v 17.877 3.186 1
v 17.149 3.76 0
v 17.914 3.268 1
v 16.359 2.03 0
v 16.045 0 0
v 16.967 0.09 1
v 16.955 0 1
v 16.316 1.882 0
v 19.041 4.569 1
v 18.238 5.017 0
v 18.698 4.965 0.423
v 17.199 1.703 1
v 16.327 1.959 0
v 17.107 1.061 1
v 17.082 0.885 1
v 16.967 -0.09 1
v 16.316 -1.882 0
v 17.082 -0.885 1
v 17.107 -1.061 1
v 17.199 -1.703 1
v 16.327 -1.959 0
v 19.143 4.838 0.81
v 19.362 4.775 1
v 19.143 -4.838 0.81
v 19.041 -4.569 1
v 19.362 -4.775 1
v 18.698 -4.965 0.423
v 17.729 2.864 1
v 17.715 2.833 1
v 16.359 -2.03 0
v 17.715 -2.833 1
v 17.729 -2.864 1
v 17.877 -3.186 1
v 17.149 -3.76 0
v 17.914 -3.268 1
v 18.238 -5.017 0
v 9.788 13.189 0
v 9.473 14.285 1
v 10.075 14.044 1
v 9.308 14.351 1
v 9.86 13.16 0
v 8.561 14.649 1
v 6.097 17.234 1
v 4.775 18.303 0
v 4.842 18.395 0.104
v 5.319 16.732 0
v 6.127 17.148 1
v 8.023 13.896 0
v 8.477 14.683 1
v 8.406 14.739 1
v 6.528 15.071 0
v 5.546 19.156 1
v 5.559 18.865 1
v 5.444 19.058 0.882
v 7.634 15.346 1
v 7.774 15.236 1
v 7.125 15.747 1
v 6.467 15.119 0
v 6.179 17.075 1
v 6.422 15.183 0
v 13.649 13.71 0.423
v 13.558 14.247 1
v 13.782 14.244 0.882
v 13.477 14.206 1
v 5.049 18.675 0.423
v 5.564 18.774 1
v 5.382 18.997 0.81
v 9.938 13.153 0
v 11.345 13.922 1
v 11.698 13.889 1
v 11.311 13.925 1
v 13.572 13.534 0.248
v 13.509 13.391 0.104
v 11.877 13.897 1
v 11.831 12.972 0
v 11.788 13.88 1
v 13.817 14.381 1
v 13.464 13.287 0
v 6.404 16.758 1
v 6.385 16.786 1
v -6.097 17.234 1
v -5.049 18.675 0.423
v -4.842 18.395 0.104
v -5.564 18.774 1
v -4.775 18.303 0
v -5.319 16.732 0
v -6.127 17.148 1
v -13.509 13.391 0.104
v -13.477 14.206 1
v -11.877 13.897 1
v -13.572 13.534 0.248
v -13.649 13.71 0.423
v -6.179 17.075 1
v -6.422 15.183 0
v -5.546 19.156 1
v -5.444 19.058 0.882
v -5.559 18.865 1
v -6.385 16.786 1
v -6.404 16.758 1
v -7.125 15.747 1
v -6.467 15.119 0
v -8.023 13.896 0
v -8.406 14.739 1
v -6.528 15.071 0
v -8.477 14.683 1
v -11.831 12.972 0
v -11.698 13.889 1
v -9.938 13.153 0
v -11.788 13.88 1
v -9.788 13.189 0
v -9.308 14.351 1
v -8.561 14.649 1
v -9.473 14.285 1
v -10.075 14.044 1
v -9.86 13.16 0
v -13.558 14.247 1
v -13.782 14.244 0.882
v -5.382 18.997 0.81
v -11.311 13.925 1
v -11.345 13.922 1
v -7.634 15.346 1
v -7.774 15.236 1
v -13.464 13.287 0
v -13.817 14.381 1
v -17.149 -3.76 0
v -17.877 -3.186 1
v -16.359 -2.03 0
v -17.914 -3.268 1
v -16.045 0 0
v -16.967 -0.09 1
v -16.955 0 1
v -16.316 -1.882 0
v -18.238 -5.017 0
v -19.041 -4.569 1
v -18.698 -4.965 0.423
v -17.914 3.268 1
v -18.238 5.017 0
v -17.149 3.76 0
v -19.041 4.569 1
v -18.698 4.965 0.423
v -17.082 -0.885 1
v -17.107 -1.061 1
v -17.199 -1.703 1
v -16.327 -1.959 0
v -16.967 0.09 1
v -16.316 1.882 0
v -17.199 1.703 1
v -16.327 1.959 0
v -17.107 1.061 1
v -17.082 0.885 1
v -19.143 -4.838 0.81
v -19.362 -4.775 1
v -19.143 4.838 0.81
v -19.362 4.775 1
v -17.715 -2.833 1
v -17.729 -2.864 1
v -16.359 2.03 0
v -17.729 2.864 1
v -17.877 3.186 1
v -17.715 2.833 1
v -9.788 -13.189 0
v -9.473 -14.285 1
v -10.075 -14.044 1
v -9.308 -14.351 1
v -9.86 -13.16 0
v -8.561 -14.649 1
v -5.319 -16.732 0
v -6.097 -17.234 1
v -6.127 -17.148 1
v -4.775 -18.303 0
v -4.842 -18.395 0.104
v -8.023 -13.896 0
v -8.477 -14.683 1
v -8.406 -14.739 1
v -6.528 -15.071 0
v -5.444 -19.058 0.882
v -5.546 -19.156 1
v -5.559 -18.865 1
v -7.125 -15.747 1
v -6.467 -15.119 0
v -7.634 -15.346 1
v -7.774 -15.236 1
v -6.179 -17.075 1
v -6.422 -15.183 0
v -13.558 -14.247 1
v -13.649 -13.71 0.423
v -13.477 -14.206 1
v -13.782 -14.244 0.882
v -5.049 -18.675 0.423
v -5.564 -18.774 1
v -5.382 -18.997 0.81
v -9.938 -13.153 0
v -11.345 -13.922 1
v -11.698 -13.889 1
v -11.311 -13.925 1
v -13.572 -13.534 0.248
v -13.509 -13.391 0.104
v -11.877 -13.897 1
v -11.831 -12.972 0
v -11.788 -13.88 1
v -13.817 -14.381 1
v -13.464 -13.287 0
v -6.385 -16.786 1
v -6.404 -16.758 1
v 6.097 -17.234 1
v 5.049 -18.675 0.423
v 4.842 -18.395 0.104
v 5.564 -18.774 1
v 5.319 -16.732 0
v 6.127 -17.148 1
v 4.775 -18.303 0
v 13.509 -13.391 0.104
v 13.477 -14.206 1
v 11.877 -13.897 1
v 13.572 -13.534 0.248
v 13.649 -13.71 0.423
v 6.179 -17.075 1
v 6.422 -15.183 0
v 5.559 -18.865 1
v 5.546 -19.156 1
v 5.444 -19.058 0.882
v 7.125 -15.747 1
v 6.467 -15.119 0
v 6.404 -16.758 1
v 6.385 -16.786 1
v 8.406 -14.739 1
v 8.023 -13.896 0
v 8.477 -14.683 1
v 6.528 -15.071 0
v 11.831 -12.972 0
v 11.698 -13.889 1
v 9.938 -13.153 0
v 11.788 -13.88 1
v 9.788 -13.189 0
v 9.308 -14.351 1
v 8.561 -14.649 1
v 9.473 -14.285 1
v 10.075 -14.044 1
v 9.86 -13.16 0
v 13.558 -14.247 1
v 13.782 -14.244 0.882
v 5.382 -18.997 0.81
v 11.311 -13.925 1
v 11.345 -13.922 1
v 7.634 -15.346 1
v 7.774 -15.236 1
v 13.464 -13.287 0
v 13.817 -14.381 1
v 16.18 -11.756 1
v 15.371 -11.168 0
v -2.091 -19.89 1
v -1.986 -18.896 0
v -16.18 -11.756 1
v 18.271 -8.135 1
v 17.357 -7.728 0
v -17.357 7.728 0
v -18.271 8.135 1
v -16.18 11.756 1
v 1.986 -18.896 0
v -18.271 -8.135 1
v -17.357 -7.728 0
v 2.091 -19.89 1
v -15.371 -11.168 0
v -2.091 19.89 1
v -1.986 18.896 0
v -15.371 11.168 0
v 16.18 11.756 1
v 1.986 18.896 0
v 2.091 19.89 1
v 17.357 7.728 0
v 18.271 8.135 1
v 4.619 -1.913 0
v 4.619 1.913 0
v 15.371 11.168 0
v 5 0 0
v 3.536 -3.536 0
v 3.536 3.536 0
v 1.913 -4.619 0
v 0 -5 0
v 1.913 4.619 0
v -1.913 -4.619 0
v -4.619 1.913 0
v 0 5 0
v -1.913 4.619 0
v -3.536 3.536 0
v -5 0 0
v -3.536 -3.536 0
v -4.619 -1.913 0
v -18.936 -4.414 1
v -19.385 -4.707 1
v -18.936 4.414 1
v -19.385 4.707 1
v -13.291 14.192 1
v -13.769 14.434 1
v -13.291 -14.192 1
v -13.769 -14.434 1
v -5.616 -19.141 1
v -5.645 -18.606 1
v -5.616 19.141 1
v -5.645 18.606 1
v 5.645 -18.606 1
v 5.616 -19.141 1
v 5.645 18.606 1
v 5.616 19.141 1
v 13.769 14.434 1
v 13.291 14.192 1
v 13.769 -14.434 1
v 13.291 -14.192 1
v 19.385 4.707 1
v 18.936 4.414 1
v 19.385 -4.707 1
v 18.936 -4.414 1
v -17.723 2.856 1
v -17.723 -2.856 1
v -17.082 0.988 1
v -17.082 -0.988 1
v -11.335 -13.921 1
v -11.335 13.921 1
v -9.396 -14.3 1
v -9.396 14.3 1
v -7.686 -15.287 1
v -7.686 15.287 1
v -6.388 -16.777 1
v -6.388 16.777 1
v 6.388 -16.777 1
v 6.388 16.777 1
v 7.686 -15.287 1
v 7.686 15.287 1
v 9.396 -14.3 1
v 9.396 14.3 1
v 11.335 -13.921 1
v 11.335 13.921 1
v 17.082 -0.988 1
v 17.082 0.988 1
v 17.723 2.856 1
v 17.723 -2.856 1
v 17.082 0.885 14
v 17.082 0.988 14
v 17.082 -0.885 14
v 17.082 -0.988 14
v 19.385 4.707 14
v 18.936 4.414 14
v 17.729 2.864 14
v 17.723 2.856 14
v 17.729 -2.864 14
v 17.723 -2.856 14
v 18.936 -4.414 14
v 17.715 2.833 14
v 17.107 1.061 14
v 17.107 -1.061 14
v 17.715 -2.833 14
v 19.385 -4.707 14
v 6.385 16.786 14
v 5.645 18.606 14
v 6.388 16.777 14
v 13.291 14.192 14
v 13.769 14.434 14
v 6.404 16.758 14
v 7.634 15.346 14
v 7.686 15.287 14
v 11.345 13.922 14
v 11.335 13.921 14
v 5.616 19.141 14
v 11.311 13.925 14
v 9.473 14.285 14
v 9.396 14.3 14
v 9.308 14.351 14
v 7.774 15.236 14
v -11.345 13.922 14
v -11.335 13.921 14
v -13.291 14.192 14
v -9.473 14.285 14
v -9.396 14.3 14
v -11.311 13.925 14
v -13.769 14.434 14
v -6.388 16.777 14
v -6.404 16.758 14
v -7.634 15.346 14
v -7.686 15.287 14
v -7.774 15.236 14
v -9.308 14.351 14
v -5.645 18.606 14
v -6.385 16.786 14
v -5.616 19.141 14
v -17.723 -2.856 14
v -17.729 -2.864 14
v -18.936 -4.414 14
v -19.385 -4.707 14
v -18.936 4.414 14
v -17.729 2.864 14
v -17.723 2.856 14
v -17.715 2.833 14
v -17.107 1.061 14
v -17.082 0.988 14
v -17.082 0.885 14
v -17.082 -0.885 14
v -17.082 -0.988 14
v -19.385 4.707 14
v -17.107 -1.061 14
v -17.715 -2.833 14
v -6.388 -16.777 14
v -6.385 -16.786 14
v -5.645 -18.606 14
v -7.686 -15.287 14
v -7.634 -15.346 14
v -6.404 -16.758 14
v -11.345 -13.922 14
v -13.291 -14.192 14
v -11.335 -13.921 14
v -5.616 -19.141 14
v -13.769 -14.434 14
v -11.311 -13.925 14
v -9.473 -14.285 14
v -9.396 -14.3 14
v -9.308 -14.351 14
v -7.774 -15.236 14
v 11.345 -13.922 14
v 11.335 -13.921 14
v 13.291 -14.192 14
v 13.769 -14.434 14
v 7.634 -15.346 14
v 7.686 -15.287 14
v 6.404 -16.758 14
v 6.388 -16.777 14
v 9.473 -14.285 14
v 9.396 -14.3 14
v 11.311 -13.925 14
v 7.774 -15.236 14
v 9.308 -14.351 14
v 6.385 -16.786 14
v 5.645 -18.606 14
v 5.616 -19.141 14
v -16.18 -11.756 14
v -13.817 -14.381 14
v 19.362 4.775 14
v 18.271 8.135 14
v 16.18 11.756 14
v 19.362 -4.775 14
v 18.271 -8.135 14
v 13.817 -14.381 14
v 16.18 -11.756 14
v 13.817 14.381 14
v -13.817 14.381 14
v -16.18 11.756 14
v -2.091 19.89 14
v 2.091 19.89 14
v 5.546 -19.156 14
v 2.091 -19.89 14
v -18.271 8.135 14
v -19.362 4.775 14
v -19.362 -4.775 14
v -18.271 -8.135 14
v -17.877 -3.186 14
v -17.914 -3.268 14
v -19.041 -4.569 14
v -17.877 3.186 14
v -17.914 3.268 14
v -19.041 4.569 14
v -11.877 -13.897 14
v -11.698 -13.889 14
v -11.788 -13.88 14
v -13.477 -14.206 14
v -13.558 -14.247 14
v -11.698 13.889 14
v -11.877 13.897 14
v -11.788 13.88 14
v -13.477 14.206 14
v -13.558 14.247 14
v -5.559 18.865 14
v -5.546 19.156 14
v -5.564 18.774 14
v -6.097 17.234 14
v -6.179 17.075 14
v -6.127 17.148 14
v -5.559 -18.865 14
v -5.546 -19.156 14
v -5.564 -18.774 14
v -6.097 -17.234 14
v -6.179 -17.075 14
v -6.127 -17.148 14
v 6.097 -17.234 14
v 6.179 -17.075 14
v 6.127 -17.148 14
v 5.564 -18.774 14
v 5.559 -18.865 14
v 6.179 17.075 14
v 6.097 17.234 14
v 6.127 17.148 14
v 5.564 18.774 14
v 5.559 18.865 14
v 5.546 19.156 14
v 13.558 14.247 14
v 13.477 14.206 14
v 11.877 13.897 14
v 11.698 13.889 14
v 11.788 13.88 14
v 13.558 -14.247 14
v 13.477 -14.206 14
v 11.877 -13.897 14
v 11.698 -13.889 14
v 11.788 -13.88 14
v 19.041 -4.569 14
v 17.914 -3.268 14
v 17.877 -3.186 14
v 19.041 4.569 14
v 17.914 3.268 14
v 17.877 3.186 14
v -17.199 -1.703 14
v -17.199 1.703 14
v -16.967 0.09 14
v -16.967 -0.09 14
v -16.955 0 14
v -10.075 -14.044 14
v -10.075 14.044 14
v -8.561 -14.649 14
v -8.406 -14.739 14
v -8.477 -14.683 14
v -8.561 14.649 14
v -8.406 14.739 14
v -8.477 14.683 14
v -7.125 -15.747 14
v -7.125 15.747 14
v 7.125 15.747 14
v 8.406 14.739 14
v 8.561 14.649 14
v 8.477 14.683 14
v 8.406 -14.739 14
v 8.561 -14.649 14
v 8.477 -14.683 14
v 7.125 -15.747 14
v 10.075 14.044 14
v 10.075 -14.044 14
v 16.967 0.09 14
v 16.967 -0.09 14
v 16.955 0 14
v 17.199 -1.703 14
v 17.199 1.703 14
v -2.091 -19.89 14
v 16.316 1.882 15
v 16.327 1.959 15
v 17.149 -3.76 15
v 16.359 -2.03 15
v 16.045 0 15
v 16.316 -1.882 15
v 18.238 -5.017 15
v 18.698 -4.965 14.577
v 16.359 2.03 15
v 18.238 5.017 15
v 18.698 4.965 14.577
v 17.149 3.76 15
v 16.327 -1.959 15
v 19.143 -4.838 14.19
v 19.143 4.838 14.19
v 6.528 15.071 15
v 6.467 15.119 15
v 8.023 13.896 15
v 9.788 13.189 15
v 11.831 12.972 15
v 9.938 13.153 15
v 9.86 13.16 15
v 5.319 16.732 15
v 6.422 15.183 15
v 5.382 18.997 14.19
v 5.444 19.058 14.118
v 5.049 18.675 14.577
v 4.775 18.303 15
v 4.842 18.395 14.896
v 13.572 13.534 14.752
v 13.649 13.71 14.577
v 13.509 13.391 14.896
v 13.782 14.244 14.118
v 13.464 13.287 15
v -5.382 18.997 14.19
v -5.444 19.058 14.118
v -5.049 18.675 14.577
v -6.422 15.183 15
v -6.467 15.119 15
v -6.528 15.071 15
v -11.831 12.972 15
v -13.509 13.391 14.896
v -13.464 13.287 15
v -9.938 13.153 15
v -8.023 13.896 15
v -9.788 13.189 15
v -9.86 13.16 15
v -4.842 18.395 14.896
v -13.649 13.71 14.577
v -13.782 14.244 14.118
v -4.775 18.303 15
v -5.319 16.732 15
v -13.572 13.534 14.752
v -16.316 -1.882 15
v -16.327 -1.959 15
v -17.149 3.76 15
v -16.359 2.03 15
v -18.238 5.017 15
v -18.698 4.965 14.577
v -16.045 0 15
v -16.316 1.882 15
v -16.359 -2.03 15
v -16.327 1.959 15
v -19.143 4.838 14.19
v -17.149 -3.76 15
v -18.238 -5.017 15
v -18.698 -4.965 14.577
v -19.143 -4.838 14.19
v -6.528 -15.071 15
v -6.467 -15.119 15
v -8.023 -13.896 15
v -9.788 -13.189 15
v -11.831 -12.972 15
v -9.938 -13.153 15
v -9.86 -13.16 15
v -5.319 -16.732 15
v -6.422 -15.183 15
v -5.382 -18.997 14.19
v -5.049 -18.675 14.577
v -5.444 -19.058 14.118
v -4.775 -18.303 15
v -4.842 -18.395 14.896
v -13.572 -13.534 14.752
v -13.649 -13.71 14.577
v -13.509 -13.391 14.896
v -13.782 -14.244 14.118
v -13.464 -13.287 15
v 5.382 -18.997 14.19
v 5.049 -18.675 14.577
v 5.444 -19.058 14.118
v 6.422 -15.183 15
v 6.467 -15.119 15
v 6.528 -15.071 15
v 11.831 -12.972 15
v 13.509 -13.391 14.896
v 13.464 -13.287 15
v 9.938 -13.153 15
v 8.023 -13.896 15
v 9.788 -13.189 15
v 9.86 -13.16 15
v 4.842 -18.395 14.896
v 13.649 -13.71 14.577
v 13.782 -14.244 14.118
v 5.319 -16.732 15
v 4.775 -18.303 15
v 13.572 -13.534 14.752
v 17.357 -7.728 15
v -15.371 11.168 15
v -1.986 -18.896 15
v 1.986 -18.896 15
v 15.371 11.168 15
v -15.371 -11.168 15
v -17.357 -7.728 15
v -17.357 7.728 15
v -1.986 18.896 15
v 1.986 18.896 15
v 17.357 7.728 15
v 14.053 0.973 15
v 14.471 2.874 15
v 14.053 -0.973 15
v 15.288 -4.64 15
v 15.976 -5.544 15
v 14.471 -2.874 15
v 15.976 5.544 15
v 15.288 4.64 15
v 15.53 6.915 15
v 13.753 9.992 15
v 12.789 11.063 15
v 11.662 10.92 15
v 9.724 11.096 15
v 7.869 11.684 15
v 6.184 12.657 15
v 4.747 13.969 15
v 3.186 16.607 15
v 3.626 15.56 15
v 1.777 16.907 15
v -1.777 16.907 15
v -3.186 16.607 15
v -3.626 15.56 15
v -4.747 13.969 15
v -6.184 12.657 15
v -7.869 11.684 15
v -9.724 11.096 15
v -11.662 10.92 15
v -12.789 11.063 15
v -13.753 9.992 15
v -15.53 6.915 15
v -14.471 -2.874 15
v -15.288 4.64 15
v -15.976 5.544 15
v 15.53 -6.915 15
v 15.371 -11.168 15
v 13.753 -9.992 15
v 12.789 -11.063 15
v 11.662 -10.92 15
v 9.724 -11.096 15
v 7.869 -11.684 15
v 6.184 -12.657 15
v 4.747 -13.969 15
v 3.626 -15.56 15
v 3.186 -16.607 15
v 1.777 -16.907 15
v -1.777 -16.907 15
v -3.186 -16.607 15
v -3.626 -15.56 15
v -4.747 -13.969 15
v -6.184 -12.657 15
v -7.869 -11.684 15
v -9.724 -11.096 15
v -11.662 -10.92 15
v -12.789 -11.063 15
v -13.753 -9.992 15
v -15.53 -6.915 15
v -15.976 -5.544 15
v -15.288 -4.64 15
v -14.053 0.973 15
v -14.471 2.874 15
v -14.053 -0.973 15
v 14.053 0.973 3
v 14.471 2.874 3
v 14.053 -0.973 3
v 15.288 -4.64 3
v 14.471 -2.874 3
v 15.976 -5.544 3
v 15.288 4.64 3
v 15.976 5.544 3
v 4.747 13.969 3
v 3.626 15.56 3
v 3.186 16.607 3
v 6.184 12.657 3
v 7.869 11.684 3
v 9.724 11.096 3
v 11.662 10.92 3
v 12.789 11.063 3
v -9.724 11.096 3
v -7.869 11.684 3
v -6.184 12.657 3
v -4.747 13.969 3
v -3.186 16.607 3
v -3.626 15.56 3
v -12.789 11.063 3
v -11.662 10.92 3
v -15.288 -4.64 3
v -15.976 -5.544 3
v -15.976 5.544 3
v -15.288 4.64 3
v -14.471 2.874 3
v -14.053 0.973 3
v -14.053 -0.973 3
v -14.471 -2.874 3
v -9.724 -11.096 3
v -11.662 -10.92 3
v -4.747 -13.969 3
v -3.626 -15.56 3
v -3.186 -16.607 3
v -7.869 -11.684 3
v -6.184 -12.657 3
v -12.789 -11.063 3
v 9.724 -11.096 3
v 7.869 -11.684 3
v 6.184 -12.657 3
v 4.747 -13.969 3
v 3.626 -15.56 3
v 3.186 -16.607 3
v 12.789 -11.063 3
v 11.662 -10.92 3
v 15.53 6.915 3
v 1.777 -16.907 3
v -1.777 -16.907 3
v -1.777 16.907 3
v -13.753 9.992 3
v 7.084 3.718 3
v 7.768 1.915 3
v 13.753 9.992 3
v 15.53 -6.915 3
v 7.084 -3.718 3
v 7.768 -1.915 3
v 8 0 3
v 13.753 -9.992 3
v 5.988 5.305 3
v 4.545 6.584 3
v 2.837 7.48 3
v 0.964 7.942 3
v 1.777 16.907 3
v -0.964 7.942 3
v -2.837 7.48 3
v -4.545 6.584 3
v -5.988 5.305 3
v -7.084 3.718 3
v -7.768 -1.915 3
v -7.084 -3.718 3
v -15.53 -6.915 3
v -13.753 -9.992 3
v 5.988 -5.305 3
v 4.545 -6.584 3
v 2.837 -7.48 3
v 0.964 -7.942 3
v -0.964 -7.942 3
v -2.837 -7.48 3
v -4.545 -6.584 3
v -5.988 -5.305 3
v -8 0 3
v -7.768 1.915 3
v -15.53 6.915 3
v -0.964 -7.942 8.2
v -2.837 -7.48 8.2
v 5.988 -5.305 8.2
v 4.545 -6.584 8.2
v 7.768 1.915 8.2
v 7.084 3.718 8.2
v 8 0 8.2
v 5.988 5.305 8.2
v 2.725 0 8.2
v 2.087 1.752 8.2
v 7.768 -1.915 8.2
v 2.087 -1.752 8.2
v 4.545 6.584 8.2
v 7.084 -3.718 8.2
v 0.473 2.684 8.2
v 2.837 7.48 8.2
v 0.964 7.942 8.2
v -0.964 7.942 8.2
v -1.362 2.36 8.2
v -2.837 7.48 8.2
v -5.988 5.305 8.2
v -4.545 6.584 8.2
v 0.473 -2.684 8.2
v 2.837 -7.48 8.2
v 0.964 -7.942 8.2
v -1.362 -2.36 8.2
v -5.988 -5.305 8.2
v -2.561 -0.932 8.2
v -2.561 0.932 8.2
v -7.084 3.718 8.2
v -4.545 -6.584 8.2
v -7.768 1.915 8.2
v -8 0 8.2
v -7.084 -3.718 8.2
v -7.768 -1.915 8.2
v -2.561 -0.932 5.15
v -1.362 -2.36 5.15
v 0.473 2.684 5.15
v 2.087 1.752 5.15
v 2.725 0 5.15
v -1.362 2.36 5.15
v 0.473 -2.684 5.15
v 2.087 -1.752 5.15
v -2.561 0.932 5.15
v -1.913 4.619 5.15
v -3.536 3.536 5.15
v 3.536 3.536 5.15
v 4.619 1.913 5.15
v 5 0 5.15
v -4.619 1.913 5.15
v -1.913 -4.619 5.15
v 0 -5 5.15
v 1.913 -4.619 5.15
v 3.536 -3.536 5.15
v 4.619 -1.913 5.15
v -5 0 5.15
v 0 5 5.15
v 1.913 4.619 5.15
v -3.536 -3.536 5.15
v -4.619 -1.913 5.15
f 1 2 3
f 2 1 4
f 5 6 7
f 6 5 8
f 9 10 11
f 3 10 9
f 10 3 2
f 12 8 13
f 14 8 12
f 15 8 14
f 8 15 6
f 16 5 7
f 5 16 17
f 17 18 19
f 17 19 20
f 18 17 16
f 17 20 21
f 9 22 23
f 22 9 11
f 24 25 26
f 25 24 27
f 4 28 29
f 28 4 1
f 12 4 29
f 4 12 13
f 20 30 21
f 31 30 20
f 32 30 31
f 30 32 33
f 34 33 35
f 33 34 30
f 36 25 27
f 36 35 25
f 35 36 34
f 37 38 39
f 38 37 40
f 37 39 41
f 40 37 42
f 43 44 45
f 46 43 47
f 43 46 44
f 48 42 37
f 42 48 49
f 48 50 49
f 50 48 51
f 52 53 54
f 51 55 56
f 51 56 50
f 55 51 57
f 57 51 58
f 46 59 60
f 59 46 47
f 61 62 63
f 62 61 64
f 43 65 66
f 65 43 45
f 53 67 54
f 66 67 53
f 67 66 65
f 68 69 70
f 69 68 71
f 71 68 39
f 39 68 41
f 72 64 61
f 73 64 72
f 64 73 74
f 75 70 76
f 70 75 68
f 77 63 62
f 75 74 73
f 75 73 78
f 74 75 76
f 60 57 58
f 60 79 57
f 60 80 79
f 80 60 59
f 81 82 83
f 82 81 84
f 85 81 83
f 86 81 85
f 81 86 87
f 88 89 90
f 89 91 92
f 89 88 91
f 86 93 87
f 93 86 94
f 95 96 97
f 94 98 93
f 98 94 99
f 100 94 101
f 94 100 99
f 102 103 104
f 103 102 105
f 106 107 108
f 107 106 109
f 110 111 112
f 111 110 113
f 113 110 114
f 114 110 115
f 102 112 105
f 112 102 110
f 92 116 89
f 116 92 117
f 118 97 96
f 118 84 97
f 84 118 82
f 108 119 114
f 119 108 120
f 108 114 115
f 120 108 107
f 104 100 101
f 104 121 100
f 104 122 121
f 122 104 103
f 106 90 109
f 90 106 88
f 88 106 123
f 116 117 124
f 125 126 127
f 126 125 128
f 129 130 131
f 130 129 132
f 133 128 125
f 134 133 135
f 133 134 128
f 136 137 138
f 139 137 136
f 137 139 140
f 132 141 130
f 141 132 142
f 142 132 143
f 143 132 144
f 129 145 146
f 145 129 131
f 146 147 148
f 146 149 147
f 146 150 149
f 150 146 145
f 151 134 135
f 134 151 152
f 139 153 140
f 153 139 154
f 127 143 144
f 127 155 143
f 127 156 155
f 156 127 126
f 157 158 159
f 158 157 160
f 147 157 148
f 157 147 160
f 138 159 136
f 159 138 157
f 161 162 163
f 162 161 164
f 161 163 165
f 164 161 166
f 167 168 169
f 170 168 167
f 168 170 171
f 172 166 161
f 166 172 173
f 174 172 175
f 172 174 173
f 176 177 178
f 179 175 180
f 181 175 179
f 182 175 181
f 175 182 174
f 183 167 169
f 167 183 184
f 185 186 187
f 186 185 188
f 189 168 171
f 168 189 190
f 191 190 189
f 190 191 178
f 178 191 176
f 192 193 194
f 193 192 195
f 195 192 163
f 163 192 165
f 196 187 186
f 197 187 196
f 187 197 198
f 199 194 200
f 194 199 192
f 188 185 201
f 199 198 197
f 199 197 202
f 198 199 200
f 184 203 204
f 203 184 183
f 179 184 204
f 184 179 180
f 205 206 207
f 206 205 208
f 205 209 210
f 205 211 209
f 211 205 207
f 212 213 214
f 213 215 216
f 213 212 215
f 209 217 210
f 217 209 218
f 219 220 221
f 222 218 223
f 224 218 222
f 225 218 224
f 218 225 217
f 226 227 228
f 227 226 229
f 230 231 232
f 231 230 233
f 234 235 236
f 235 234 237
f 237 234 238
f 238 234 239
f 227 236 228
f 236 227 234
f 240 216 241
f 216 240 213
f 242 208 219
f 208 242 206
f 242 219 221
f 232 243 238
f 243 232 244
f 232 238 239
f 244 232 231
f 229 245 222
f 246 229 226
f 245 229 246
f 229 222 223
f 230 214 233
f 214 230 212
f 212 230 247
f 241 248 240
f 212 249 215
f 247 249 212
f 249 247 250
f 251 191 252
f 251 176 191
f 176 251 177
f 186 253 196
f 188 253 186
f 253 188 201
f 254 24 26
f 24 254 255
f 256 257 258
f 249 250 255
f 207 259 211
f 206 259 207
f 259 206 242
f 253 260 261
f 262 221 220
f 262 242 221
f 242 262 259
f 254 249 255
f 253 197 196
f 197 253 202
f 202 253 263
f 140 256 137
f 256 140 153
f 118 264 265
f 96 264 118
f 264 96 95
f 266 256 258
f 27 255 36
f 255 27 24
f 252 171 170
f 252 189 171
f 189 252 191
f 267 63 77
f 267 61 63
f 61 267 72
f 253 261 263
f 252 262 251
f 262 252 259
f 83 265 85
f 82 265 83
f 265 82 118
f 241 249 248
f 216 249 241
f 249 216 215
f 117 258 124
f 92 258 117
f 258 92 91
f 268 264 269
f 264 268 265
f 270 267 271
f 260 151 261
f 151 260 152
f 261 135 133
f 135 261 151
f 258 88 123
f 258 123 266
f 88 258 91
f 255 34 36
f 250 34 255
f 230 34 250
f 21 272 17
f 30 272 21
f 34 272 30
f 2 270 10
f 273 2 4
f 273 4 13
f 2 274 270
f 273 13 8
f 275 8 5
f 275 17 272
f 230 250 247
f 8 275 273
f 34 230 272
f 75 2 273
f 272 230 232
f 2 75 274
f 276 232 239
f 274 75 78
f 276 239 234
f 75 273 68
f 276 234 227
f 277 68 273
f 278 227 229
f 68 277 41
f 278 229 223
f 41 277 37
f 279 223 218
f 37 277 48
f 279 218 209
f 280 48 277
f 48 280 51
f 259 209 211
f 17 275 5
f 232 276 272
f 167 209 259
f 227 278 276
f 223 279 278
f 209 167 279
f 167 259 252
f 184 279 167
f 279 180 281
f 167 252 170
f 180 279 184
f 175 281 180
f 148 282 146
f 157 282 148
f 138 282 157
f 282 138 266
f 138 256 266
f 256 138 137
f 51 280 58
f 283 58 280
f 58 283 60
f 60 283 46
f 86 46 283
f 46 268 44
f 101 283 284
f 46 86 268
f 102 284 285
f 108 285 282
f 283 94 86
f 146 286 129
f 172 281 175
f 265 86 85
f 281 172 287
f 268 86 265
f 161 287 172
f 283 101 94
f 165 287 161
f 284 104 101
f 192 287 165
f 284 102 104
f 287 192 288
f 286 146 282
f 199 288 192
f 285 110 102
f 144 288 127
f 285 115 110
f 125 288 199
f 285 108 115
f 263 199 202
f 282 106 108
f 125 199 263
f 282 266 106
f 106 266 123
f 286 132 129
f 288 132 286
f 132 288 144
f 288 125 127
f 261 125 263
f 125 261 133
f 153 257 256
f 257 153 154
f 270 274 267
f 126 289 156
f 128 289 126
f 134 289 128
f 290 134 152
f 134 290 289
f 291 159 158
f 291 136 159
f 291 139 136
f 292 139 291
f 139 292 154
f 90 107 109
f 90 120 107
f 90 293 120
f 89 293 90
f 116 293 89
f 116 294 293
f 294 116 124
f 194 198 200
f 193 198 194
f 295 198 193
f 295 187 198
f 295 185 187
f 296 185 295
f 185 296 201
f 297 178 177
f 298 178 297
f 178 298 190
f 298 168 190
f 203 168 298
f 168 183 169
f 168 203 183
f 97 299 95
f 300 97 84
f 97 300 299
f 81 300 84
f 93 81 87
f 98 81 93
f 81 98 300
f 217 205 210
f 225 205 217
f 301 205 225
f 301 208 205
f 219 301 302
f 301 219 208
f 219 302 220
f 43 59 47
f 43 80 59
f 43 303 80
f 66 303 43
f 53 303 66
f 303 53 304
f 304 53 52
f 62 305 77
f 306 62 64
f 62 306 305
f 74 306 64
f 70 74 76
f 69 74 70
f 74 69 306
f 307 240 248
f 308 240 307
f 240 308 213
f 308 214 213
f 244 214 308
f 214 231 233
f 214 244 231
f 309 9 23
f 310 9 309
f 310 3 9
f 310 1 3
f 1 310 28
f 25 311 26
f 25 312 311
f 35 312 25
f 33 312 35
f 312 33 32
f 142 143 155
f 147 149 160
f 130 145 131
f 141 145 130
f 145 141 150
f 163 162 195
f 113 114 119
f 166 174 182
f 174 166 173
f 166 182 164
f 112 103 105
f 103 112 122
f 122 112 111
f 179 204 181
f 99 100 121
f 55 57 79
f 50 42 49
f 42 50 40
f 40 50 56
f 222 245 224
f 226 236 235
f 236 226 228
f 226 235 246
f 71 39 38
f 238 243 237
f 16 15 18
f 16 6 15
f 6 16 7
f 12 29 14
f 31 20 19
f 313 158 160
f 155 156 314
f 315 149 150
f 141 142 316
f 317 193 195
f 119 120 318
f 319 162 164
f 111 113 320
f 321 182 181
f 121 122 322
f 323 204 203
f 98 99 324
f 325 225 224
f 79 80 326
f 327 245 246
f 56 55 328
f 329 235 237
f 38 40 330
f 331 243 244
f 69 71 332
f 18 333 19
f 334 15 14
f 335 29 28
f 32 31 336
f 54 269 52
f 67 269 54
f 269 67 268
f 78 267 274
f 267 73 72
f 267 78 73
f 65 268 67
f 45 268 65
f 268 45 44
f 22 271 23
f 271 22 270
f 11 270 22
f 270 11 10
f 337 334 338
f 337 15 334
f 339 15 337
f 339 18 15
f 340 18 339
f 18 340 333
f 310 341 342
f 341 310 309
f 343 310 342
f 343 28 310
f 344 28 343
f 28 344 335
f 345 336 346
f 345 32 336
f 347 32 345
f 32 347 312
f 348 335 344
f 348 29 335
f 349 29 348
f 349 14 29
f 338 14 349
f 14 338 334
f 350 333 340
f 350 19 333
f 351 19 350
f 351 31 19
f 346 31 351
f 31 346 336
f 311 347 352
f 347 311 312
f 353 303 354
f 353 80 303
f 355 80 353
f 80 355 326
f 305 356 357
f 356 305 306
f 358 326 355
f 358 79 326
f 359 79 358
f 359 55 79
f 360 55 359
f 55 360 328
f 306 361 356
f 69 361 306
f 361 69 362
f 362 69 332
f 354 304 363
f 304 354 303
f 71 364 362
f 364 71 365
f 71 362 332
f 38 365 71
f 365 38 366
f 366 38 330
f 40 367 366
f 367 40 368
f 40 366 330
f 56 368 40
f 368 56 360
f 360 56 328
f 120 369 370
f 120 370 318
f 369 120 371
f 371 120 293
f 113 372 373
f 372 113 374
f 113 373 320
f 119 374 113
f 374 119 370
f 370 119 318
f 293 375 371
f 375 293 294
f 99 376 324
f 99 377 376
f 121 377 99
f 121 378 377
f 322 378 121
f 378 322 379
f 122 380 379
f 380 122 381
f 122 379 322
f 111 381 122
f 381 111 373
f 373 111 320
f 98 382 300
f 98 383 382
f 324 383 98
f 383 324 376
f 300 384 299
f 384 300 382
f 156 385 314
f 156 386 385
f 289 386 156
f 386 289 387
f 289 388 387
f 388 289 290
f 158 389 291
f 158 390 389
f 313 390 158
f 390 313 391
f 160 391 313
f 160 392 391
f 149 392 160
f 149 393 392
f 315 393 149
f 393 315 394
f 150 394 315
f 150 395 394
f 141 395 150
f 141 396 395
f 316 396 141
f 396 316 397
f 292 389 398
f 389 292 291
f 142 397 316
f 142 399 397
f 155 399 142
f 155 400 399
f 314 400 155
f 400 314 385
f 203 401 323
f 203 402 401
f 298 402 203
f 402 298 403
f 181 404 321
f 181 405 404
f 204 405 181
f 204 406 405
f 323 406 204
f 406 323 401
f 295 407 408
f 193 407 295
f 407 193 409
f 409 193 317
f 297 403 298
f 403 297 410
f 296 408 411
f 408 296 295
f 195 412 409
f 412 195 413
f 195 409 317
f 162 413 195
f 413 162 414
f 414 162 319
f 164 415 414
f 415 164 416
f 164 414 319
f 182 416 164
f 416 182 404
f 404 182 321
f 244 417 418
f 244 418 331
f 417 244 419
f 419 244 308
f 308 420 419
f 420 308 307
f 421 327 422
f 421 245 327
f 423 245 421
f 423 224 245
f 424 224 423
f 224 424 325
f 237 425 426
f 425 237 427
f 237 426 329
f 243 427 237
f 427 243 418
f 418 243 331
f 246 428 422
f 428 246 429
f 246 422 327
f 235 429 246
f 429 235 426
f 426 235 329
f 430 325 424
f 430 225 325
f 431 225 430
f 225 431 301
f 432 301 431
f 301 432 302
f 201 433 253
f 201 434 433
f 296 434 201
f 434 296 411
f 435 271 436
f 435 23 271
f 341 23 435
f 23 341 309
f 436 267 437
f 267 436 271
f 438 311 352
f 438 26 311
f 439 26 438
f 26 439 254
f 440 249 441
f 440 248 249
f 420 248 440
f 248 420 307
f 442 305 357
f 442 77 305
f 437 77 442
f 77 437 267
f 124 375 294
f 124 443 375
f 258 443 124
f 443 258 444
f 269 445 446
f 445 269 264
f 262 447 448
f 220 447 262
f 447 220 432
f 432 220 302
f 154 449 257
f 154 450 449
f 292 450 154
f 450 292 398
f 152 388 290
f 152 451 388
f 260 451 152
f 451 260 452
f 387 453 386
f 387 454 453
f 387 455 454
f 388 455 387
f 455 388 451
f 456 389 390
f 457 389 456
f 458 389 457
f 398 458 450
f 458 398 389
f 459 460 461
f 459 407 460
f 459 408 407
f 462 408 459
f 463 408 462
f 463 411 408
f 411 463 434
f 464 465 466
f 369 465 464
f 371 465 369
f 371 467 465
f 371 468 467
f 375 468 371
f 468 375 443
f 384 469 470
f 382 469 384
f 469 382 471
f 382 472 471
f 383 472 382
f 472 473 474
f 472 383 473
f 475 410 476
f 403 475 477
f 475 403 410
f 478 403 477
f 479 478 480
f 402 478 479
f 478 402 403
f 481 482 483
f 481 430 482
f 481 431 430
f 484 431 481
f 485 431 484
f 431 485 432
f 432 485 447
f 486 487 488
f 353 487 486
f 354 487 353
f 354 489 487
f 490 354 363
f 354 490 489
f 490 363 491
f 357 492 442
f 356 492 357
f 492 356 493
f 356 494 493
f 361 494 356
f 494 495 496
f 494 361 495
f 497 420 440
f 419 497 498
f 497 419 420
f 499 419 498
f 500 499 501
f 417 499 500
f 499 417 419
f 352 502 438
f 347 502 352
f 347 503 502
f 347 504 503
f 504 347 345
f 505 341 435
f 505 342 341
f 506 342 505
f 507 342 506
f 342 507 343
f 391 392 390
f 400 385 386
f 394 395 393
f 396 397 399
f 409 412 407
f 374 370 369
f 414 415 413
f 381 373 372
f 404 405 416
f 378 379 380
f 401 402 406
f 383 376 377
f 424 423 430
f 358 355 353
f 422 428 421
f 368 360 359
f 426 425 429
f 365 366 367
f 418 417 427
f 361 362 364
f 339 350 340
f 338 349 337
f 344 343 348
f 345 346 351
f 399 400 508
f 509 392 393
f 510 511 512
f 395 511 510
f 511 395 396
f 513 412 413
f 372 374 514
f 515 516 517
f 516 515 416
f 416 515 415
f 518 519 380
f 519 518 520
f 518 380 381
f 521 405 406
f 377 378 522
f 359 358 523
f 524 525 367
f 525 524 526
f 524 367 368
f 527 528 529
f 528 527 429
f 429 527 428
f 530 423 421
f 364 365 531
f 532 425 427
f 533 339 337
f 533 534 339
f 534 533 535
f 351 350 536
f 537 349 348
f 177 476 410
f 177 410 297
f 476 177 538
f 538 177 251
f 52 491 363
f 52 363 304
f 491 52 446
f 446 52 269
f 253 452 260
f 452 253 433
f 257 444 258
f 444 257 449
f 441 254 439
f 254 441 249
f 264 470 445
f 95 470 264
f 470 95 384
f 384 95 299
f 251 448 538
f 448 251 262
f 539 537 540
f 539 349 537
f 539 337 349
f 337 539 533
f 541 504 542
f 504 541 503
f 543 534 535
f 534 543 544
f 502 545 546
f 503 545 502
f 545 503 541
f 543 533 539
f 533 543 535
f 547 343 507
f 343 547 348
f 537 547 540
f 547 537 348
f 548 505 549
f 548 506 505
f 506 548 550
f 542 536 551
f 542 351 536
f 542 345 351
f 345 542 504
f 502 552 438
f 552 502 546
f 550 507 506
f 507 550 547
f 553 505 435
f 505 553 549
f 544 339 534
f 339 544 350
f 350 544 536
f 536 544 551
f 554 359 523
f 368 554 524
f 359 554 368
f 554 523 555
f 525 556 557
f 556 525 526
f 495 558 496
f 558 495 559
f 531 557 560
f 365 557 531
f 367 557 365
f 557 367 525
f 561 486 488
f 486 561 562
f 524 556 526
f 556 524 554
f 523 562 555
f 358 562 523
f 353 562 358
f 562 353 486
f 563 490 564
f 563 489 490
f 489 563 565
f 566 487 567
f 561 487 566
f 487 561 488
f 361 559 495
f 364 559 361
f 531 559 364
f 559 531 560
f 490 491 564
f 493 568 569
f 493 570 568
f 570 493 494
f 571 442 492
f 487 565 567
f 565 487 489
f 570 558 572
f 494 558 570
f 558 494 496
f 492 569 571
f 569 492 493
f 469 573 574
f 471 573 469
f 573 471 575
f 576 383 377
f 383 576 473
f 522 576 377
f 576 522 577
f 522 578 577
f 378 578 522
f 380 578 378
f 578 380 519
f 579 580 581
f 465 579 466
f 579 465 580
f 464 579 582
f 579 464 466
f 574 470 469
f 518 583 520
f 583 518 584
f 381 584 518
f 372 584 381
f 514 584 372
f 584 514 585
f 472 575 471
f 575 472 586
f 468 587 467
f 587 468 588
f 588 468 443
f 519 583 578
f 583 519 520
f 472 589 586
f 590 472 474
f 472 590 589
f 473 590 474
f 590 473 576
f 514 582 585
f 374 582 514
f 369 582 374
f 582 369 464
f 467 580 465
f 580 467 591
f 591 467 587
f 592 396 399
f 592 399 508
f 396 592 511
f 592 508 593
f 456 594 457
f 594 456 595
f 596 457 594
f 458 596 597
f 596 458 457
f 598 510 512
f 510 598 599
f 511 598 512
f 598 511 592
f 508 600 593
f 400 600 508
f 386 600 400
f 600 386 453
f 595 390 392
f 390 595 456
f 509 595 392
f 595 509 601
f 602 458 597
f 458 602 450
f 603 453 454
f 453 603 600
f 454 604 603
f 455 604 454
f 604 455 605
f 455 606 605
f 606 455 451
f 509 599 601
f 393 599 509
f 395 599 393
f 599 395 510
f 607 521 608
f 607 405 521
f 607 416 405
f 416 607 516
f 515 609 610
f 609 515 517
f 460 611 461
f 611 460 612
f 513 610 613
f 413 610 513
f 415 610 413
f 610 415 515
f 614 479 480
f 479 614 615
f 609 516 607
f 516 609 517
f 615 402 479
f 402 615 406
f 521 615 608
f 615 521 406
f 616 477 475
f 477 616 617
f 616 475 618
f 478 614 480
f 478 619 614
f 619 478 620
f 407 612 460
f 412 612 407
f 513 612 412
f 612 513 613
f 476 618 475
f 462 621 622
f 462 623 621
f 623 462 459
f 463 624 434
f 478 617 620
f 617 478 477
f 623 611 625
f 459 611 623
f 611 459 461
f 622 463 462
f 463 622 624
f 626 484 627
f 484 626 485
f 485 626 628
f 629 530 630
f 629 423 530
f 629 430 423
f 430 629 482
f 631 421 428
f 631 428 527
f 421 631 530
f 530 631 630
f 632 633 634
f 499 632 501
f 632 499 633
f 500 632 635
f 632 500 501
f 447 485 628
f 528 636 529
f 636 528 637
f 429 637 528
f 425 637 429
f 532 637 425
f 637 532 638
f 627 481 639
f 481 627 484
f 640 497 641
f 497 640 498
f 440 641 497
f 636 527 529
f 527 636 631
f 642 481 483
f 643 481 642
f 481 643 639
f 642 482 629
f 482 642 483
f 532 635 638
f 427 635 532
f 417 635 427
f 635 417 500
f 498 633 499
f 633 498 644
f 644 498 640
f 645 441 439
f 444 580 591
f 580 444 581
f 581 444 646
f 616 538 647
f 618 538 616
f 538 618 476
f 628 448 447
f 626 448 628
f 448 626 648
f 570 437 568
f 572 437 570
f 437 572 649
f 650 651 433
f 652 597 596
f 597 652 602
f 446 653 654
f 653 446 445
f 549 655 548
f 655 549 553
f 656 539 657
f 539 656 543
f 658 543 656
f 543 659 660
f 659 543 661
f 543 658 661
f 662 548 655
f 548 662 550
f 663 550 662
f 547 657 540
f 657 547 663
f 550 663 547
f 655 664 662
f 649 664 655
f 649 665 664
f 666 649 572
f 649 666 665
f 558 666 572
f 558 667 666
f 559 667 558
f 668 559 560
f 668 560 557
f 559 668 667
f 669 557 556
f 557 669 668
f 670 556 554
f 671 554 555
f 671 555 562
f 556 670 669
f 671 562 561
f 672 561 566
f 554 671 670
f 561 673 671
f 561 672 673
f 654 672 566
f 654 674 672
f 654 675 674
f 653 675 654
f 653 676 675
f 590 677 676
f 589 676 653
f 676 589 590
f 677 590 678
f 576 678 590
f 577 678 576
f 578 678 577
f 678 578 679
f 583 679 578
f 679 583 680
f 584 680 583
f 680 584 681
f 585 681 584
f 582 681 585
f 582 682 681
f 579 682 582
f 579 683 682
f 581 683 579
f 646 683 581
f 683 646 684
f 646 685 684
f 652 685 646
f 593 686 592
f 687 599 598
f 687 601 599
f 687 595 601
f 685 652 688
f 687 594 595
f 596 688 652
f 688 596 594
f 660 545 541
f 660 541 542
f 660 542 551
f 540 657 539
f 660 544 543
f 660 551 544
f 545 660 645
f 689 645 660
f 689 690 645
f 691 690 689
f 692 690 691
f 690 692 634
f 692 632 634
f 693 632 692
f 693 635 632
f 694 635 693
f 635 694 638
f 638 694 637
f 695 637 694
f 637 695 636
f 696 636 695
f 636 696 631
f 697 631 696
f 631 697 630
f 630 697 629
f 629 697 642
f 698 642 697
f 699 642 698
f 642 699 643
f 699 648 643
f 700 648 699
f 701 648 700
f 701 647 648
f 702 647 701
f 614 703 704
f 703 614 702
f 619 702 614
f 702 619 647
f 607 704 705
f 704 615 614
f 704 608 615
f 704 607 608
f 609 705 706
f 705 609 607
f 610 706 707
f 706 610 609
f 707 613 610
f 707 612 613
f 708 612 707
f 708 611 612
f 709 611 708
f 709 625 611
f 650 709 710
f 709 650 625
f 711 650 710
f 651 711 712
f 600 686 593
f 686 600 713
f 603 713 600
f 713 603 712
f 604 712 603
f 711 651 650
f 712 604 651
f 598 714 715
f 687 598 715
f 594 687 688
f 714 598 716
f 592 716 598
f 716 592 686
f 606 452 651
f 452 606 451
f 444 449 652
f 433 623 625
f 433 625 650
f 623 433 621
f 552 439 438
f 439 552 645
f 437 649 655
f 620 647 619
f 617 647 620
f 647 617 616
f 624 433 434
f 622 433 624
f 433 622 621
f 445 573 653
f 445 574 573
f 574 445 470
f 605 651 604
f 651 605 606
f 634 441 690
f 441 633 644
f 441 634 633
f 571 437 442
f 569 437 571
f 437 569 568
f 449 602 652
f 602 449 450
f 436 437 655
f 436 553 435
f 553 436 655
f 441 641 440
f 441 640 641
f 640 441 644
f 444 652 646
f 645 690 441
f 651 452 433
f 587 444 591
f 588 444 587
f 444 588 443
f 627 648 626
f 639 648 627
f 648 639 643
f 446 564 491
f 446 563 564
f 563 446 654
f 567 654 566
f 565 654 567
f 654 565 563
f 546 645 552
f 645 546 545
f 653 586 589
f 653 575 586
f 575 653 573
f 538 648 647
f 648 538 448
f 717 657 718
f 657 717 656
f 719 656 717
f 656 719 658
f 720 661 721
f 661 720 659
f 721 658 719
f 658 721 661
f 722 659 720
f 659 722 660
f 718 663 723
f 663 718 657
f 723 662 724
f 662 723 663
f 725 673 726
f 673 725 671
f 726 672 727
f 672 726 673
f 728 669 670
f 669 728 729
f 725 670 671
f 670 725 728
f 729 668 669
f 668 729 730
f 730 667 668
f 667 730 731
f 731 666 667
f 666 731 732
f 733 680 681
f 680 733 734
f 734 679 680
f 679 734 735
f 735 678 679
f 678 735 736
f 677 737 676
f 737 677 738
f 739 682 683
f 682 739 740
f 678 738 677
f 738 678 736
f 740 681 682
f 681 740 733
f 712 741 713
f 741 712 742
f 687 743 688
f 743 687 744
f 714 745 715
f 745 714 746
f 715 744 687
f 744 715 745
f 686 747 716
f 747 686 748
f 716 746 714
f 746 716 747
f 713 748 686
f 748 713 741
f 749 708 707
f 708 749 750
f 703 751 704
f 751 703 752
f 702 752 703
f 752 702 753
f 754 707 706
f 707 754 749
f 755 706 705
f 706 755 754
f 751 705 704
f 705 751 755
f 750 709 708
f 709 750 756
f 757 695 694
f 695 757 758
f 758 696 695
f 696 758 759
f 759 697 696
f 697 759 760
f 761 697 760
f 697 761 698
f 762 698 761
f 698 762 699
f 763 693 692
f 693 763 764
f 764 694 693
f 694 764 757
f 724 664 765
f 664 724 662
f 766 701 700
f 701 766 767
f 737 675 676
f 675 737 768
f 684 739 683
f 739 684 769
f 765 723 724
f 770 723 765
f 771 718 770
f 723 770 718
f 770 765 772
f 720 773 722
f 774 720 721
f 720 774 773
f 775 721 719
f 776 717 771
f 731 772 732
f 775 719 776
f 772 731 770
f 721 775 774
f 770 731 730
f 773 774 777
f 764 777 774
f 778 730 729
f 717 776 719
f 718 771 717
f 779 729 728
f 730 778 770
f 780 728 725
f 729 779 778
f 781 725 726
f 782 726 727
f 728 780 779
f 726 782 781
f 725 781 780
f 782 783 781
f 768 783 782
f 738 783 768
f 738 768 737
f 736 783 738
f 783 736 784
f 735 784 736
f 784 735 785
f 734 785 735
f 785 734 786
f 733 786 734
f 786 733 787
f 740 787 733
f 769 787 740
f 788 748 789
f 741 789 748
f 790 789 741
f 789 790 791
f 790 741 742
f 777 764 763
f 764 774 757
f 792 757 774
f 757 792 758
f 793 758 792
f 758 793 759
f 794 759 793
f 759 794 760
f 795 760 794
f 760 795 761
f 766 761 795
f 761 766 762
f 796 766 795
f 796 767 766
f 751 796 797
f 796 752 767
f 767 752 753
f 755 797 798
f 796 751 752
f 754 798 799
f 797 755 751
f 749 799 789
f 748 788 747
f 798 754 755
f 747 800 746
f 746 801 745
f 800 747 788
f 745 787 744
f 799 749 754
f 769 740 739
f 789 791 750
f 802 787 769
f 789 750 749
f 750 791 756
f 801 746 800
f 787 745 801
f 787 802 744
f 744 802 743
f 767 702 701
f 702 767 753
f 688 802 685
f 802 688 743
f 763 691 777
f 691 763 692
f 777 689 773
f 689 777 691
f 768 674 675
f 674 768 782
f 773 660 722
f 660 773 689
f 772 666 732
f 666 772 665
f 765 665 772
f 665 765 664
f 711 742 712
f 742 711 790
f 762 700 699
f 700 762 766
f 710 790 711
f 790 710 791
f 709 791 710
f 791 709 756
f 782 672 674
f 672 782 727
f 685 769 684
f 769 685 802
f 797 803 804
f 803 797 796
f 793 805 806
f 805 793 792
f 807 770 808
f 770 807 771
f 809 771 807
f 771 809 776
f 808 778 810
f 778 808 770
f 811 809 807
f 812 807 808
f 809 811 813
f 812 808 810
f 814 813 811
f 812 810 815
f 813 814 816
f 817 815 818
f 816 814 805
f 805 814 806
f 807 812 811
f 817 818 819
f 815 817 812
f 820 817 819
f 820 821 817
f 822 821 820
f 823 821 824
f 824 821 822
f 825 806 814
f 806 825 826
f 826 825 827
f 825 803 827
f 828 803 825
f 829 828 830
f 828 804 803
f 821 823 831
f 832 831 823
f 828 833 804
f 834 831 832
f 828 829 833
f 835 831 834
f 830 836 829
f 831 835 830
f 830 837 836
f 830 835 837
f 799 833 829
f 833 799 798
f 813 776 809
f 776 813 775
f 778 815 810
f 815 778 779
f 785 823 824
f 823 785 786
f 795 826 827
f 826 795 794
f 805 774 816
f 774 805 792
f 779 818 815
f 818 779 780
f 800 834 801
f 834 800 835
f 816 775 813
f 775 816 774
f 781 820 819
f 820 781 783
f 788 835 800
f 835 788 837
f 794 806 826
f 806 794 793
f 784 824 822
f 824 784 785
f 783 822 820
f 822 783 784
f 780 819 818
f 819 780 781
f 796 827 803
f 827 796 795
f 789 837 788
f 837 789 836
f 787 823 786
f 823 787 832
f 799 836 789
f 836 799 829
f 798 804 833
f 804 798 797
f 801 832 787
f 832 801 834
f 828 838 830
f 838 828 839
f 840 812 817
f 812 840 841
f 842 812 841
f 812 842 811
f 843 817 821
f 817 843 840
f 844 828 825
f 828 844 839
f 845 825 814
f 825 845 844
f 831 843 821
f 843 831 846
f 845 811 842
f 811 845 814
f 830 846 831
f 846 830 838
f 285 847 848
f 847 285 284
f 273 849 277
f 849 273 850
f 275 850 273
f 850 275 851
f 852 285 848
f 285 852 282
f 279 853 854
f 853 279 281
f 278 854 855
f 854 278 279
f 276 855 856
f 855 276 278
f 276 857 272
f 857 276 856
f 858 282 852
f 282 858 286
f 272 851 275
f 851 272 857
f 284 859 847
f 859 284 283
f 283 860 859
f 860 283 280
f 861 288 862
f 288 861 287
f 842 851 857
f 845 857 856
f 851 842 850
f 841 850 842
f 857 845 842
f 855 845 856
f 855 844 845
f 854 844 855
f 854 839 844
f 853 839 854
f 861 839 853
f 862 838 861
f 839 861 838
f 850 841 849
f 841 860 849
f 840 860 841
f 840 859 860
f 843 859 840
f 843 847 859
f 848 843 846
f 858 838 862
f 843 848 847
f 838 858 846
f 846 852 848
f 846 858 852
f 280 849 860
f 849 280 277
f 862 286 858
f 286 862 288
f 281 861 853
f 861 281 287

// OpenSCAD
// [FL_INDEX: keywords="openscad, 3d_parametric, Customizable_Thumb_Knob_-_Metric, csg_solid" | COT="Parametric OpenSCAD design from 3DCodeverse"]
// Title: Customizable Thumb Knob - Metric

/*
Universal Thumbnut/Socket Knob Design
By: Harrison Fast (2013)

This is a parametric script for a thumb knob which can be used on either a nut, hex head cap screw, or socket head cap screw.
Options include:
unit of measure (metric, imperial)
thread size []
pocket type (Constant_Wall_Thickness, Solid, Circular)
knob diameter
number of rosettes (fingers/cutouts)
size and position of rosette
wall thickness
top wall thickness

Should work in the Thingiverse Customizer

*/

//****Variables - To be Set****\\
//CUSTOMIZER VARIABLES

//What's This Knob For?
Knob_Type=3;//[1:Nut,2:Hex Head Screw,3:Socket Head Screw]

//What Size Nut or Screw? 
Thread_Size=6; //[0:M1.6,1:M2,2:M2.5,3:M3,4:M4,5:M5,6:M6,7:M8,8:M10,9:M12,10:M14,11:M16,12:M20]

//What Kind of Pocket Do You Want?
Knob_Fill=1;//[1:Constant Wall Thickness,2:Solid,3:Circular Cut-Out]

//How Big Should The Knob Be?
Knob_Diameter = 40;
knob_r = Knob_Diameter/2;

//How Thick Should the Grip Be? (Overall Height)
Knob_Thickness=15;
knob_t=Knob_Thickness*1;

//How Thick Should The Walls Be?
Wall_Thickness=3;

//How Many Prongs Should It Have?
Number_of_Rosettes=6; //[1:16]

//How Big Should The Finger Dents Be?
Rosette_Radius=6; 

//How Far Should The Finger Dents be From The Knob Circumference? (This lets you use larger radii by moving the center of the cut-out cylinder away from the center of the knob)
Rosette_Offset = 3;

//How Big Should the Bevel Be?
Chamfer_Size=1;
r_cham = Chamfer_Size*1; //Too lazy to change the proper names to Chamfer_Size

//How Much Clearance Do You Want? 0 probably won't work.
Clearance=.25; //[0:.125:1];

//CUSTOMIZER VARIABLES END


//$fa=6;


echo(knob_t);
knob_hex(); //main function call


//****MODULES***\\

module hex_trude(hex_width,hex_height) //makes a hexagonal prism at hex_width
	{	
		s = hex_width/1.732;
		l_x=s/2;
		l_y=.866*s;
		a_1 = [ [s,0],[l_x,-l_y],[-l_x,-l_y],[-s,0],[-l_x,l_y],[l_x,l_y]];
		b=[0:5];
		linear_extrude (height = hex_height) polygon(a_1,b);
	}


module pocket(hex_width,hex_height)
{	
	if(Knob_Fill==1){
		difference() {
			 translate([0,0,Wall_Thickness]) {cylinder(h=hex_height, r=knob_r-Wall_Thickness);} //wall offset
				for(i=[0:Number_of_Rosettes-1]) {
					rotate([0,0,360*i/Number_of_Rosettes]) 
						translate([knob_r+Rosette_Offset,0,0]) {
							cylinder(h = Wall_Thickness+hex_height, r = Rosette_Radius+Wall_Thickness); } //wall offset rosette
								}
	}//endif
					}

	else if(Knob_Fill==2){
	}//endif

	else if(Knob_Fill==3) {
		translate([0,0,Wall_Thickness]) {
			cylinder(h=hex_height,r=knob_r-Wall_Thickness-Rosette_Radius+Rosette_Offset);
						}
	}//endif
			
} //end module pocket()



module knobby_base_parts(knob_r, knob_h, rA, rB)
{
	difference()
	{
		cylinder(h=knob_h,r1=knob_r-rA,r2=knob_r-rB);
		for(i=[0:Number_of_Rosettes]){
			rotate(360*i/Number_of_Rosettes,[0,0,1]) translate([knob_r+Rosette_Offset,0,-0.05])
				cylinder(h=knob_h+.1,r1=Rosette_Radius+rA,r2=Rosette_Radius+rB);
		} //end if
	} //end difference
} //end knobby_base_parts



module knobby_base(hex_width,hex_height,r_cham)
{
	difference(){
			union() {
				knobby_base_parts(knob_r,r_cham,r_cham,0);
				if(hex_height<Wall_Thickness){
					union() {
						translate([0,0,r_cham]) knobby_base_parts(knob_r,Wall_Thickness-2*r_cham,0,0); 
						translate([0,0,Wall_Thickness]) knobby_base_parts(knob_r, r_cham,0,r_cham);}}

				else {translate([0,0,r_cham]) knobby_base_parts(knob_r,hex_height-2*r_cham,0,0);
					union() {
						translate([0,0,r_cham]) knobby_base_parts(knob_r,hex_height-2*r_cham,0,0); 
						translate([0,0,hex_height-r_cham]) knobby_base_parts(knob_r, r_cham,0,r_cham); }}
				} //end union
			pocket(hex_width,hex_height+1);
					} //end difference
} //end knobby_base


module make_knob(hex_width,hex_height,r_cham)
{
	if(Knob_Type==1){
	difference(){
			union(){
			rotate(0,[0,0,1]) {
			difference(){
				knobby_base(hex_width,knob_t,r_cham);
				translate([0,0,Wall_Thickness])hex_trude(hex_width+.25,hex_height+1+knob_t);
				}}
			translate([0,0,Wall_Thickness]) {
				difference() {
					hex_trude(hex_width+Wall_Thickness*2,hex_height);
					hex_trude(hex_width+.25,hex_height+.1);}
					}}
		translate([0,0,-.1]) cylinder(h=Wall_Thickness+hex_height+.2, r = Thread_Size/2+.25);
	 } 	//end Difference
	} //end if

	else if(Knob_Type==2) {
	difference() {
		union() {
			knobby_base(hex_width,knob_t,r_cham);
			cylinder(h=hex_height+Wall_Thickness, r=hex_width/2+Wall_Thickness);
			} //end union
		translate([0,0,-.05]) hex_trude(hex_width+.25,hex_height);
		translate([0,0,-.5]) cylinder(h=hex_height+Wall_Thickness+1+knob_t, r=thread_d[Thread_Size]/2+.125);
		}//end difference
	}//end if
			

	else if(Knob_Type==3) {
	difference(){
		union() {
			knobby_base(hex_width,knob_t,r_cham);
			cylinder(h=hex_height+Wall_Thickness, r=hex_width/2+Wall_Thickness);
		}//end union
			translate([0,0,-.05]) cylinder(h=hex_height+Knob_Thickness, r=hex_height/2+.125);
			translate([0,0,-.05]) cylinder(h=hex_height, r=hex_width/2);
	} //end difference
		} //end if
} //end module make_knob_hex


module knob_hex(){
	if (Knob_Type==1 || 2){
		make_knob(hex_w_table[Thread_Size],hex_h_table[Thread_Size],r_cham);
		}//end if
	else if (Knob_Type==3){
		make_knob(shcs_d_table[Thread_Size],thread_d[Thread_Size],r_cham);
} //end_if
} //end knob_hex

//****END KNOB BUILDING****\\

//****LOOKUP TABLES****\\

//----Lookup----\\

//----Thread Outer Diameter----\\\\
thread_d=[1.6,2,2.5,3,4,5,6,8,10,12,14,16,20,24];

//----Hex Width----\\
hex_w_table=[3.2,4,5,5.5,7,8,10,13,16,18,21,24,30,36];

//----Hex Height----\\
hex_h_table=[1.3,1.6,2,2.4,3.2,4.7,5.2,6.8,8.4,10.8,12.8,14.8,18,21.5];

//----Hex Head Height----\\
hex_head_height=[1.3,2,2.1,2.1,2.9,3.5,4.1,5.4,6.5,7.6,8.8,10,12.5,15];

//----SHCS Diameter----\\
shcs_d_table=[2.5,3.8,4.2,5.5,7,8.5,10,13,16,18,21,24,27,30];
//----SHCS Height = Thread Size!---\\
